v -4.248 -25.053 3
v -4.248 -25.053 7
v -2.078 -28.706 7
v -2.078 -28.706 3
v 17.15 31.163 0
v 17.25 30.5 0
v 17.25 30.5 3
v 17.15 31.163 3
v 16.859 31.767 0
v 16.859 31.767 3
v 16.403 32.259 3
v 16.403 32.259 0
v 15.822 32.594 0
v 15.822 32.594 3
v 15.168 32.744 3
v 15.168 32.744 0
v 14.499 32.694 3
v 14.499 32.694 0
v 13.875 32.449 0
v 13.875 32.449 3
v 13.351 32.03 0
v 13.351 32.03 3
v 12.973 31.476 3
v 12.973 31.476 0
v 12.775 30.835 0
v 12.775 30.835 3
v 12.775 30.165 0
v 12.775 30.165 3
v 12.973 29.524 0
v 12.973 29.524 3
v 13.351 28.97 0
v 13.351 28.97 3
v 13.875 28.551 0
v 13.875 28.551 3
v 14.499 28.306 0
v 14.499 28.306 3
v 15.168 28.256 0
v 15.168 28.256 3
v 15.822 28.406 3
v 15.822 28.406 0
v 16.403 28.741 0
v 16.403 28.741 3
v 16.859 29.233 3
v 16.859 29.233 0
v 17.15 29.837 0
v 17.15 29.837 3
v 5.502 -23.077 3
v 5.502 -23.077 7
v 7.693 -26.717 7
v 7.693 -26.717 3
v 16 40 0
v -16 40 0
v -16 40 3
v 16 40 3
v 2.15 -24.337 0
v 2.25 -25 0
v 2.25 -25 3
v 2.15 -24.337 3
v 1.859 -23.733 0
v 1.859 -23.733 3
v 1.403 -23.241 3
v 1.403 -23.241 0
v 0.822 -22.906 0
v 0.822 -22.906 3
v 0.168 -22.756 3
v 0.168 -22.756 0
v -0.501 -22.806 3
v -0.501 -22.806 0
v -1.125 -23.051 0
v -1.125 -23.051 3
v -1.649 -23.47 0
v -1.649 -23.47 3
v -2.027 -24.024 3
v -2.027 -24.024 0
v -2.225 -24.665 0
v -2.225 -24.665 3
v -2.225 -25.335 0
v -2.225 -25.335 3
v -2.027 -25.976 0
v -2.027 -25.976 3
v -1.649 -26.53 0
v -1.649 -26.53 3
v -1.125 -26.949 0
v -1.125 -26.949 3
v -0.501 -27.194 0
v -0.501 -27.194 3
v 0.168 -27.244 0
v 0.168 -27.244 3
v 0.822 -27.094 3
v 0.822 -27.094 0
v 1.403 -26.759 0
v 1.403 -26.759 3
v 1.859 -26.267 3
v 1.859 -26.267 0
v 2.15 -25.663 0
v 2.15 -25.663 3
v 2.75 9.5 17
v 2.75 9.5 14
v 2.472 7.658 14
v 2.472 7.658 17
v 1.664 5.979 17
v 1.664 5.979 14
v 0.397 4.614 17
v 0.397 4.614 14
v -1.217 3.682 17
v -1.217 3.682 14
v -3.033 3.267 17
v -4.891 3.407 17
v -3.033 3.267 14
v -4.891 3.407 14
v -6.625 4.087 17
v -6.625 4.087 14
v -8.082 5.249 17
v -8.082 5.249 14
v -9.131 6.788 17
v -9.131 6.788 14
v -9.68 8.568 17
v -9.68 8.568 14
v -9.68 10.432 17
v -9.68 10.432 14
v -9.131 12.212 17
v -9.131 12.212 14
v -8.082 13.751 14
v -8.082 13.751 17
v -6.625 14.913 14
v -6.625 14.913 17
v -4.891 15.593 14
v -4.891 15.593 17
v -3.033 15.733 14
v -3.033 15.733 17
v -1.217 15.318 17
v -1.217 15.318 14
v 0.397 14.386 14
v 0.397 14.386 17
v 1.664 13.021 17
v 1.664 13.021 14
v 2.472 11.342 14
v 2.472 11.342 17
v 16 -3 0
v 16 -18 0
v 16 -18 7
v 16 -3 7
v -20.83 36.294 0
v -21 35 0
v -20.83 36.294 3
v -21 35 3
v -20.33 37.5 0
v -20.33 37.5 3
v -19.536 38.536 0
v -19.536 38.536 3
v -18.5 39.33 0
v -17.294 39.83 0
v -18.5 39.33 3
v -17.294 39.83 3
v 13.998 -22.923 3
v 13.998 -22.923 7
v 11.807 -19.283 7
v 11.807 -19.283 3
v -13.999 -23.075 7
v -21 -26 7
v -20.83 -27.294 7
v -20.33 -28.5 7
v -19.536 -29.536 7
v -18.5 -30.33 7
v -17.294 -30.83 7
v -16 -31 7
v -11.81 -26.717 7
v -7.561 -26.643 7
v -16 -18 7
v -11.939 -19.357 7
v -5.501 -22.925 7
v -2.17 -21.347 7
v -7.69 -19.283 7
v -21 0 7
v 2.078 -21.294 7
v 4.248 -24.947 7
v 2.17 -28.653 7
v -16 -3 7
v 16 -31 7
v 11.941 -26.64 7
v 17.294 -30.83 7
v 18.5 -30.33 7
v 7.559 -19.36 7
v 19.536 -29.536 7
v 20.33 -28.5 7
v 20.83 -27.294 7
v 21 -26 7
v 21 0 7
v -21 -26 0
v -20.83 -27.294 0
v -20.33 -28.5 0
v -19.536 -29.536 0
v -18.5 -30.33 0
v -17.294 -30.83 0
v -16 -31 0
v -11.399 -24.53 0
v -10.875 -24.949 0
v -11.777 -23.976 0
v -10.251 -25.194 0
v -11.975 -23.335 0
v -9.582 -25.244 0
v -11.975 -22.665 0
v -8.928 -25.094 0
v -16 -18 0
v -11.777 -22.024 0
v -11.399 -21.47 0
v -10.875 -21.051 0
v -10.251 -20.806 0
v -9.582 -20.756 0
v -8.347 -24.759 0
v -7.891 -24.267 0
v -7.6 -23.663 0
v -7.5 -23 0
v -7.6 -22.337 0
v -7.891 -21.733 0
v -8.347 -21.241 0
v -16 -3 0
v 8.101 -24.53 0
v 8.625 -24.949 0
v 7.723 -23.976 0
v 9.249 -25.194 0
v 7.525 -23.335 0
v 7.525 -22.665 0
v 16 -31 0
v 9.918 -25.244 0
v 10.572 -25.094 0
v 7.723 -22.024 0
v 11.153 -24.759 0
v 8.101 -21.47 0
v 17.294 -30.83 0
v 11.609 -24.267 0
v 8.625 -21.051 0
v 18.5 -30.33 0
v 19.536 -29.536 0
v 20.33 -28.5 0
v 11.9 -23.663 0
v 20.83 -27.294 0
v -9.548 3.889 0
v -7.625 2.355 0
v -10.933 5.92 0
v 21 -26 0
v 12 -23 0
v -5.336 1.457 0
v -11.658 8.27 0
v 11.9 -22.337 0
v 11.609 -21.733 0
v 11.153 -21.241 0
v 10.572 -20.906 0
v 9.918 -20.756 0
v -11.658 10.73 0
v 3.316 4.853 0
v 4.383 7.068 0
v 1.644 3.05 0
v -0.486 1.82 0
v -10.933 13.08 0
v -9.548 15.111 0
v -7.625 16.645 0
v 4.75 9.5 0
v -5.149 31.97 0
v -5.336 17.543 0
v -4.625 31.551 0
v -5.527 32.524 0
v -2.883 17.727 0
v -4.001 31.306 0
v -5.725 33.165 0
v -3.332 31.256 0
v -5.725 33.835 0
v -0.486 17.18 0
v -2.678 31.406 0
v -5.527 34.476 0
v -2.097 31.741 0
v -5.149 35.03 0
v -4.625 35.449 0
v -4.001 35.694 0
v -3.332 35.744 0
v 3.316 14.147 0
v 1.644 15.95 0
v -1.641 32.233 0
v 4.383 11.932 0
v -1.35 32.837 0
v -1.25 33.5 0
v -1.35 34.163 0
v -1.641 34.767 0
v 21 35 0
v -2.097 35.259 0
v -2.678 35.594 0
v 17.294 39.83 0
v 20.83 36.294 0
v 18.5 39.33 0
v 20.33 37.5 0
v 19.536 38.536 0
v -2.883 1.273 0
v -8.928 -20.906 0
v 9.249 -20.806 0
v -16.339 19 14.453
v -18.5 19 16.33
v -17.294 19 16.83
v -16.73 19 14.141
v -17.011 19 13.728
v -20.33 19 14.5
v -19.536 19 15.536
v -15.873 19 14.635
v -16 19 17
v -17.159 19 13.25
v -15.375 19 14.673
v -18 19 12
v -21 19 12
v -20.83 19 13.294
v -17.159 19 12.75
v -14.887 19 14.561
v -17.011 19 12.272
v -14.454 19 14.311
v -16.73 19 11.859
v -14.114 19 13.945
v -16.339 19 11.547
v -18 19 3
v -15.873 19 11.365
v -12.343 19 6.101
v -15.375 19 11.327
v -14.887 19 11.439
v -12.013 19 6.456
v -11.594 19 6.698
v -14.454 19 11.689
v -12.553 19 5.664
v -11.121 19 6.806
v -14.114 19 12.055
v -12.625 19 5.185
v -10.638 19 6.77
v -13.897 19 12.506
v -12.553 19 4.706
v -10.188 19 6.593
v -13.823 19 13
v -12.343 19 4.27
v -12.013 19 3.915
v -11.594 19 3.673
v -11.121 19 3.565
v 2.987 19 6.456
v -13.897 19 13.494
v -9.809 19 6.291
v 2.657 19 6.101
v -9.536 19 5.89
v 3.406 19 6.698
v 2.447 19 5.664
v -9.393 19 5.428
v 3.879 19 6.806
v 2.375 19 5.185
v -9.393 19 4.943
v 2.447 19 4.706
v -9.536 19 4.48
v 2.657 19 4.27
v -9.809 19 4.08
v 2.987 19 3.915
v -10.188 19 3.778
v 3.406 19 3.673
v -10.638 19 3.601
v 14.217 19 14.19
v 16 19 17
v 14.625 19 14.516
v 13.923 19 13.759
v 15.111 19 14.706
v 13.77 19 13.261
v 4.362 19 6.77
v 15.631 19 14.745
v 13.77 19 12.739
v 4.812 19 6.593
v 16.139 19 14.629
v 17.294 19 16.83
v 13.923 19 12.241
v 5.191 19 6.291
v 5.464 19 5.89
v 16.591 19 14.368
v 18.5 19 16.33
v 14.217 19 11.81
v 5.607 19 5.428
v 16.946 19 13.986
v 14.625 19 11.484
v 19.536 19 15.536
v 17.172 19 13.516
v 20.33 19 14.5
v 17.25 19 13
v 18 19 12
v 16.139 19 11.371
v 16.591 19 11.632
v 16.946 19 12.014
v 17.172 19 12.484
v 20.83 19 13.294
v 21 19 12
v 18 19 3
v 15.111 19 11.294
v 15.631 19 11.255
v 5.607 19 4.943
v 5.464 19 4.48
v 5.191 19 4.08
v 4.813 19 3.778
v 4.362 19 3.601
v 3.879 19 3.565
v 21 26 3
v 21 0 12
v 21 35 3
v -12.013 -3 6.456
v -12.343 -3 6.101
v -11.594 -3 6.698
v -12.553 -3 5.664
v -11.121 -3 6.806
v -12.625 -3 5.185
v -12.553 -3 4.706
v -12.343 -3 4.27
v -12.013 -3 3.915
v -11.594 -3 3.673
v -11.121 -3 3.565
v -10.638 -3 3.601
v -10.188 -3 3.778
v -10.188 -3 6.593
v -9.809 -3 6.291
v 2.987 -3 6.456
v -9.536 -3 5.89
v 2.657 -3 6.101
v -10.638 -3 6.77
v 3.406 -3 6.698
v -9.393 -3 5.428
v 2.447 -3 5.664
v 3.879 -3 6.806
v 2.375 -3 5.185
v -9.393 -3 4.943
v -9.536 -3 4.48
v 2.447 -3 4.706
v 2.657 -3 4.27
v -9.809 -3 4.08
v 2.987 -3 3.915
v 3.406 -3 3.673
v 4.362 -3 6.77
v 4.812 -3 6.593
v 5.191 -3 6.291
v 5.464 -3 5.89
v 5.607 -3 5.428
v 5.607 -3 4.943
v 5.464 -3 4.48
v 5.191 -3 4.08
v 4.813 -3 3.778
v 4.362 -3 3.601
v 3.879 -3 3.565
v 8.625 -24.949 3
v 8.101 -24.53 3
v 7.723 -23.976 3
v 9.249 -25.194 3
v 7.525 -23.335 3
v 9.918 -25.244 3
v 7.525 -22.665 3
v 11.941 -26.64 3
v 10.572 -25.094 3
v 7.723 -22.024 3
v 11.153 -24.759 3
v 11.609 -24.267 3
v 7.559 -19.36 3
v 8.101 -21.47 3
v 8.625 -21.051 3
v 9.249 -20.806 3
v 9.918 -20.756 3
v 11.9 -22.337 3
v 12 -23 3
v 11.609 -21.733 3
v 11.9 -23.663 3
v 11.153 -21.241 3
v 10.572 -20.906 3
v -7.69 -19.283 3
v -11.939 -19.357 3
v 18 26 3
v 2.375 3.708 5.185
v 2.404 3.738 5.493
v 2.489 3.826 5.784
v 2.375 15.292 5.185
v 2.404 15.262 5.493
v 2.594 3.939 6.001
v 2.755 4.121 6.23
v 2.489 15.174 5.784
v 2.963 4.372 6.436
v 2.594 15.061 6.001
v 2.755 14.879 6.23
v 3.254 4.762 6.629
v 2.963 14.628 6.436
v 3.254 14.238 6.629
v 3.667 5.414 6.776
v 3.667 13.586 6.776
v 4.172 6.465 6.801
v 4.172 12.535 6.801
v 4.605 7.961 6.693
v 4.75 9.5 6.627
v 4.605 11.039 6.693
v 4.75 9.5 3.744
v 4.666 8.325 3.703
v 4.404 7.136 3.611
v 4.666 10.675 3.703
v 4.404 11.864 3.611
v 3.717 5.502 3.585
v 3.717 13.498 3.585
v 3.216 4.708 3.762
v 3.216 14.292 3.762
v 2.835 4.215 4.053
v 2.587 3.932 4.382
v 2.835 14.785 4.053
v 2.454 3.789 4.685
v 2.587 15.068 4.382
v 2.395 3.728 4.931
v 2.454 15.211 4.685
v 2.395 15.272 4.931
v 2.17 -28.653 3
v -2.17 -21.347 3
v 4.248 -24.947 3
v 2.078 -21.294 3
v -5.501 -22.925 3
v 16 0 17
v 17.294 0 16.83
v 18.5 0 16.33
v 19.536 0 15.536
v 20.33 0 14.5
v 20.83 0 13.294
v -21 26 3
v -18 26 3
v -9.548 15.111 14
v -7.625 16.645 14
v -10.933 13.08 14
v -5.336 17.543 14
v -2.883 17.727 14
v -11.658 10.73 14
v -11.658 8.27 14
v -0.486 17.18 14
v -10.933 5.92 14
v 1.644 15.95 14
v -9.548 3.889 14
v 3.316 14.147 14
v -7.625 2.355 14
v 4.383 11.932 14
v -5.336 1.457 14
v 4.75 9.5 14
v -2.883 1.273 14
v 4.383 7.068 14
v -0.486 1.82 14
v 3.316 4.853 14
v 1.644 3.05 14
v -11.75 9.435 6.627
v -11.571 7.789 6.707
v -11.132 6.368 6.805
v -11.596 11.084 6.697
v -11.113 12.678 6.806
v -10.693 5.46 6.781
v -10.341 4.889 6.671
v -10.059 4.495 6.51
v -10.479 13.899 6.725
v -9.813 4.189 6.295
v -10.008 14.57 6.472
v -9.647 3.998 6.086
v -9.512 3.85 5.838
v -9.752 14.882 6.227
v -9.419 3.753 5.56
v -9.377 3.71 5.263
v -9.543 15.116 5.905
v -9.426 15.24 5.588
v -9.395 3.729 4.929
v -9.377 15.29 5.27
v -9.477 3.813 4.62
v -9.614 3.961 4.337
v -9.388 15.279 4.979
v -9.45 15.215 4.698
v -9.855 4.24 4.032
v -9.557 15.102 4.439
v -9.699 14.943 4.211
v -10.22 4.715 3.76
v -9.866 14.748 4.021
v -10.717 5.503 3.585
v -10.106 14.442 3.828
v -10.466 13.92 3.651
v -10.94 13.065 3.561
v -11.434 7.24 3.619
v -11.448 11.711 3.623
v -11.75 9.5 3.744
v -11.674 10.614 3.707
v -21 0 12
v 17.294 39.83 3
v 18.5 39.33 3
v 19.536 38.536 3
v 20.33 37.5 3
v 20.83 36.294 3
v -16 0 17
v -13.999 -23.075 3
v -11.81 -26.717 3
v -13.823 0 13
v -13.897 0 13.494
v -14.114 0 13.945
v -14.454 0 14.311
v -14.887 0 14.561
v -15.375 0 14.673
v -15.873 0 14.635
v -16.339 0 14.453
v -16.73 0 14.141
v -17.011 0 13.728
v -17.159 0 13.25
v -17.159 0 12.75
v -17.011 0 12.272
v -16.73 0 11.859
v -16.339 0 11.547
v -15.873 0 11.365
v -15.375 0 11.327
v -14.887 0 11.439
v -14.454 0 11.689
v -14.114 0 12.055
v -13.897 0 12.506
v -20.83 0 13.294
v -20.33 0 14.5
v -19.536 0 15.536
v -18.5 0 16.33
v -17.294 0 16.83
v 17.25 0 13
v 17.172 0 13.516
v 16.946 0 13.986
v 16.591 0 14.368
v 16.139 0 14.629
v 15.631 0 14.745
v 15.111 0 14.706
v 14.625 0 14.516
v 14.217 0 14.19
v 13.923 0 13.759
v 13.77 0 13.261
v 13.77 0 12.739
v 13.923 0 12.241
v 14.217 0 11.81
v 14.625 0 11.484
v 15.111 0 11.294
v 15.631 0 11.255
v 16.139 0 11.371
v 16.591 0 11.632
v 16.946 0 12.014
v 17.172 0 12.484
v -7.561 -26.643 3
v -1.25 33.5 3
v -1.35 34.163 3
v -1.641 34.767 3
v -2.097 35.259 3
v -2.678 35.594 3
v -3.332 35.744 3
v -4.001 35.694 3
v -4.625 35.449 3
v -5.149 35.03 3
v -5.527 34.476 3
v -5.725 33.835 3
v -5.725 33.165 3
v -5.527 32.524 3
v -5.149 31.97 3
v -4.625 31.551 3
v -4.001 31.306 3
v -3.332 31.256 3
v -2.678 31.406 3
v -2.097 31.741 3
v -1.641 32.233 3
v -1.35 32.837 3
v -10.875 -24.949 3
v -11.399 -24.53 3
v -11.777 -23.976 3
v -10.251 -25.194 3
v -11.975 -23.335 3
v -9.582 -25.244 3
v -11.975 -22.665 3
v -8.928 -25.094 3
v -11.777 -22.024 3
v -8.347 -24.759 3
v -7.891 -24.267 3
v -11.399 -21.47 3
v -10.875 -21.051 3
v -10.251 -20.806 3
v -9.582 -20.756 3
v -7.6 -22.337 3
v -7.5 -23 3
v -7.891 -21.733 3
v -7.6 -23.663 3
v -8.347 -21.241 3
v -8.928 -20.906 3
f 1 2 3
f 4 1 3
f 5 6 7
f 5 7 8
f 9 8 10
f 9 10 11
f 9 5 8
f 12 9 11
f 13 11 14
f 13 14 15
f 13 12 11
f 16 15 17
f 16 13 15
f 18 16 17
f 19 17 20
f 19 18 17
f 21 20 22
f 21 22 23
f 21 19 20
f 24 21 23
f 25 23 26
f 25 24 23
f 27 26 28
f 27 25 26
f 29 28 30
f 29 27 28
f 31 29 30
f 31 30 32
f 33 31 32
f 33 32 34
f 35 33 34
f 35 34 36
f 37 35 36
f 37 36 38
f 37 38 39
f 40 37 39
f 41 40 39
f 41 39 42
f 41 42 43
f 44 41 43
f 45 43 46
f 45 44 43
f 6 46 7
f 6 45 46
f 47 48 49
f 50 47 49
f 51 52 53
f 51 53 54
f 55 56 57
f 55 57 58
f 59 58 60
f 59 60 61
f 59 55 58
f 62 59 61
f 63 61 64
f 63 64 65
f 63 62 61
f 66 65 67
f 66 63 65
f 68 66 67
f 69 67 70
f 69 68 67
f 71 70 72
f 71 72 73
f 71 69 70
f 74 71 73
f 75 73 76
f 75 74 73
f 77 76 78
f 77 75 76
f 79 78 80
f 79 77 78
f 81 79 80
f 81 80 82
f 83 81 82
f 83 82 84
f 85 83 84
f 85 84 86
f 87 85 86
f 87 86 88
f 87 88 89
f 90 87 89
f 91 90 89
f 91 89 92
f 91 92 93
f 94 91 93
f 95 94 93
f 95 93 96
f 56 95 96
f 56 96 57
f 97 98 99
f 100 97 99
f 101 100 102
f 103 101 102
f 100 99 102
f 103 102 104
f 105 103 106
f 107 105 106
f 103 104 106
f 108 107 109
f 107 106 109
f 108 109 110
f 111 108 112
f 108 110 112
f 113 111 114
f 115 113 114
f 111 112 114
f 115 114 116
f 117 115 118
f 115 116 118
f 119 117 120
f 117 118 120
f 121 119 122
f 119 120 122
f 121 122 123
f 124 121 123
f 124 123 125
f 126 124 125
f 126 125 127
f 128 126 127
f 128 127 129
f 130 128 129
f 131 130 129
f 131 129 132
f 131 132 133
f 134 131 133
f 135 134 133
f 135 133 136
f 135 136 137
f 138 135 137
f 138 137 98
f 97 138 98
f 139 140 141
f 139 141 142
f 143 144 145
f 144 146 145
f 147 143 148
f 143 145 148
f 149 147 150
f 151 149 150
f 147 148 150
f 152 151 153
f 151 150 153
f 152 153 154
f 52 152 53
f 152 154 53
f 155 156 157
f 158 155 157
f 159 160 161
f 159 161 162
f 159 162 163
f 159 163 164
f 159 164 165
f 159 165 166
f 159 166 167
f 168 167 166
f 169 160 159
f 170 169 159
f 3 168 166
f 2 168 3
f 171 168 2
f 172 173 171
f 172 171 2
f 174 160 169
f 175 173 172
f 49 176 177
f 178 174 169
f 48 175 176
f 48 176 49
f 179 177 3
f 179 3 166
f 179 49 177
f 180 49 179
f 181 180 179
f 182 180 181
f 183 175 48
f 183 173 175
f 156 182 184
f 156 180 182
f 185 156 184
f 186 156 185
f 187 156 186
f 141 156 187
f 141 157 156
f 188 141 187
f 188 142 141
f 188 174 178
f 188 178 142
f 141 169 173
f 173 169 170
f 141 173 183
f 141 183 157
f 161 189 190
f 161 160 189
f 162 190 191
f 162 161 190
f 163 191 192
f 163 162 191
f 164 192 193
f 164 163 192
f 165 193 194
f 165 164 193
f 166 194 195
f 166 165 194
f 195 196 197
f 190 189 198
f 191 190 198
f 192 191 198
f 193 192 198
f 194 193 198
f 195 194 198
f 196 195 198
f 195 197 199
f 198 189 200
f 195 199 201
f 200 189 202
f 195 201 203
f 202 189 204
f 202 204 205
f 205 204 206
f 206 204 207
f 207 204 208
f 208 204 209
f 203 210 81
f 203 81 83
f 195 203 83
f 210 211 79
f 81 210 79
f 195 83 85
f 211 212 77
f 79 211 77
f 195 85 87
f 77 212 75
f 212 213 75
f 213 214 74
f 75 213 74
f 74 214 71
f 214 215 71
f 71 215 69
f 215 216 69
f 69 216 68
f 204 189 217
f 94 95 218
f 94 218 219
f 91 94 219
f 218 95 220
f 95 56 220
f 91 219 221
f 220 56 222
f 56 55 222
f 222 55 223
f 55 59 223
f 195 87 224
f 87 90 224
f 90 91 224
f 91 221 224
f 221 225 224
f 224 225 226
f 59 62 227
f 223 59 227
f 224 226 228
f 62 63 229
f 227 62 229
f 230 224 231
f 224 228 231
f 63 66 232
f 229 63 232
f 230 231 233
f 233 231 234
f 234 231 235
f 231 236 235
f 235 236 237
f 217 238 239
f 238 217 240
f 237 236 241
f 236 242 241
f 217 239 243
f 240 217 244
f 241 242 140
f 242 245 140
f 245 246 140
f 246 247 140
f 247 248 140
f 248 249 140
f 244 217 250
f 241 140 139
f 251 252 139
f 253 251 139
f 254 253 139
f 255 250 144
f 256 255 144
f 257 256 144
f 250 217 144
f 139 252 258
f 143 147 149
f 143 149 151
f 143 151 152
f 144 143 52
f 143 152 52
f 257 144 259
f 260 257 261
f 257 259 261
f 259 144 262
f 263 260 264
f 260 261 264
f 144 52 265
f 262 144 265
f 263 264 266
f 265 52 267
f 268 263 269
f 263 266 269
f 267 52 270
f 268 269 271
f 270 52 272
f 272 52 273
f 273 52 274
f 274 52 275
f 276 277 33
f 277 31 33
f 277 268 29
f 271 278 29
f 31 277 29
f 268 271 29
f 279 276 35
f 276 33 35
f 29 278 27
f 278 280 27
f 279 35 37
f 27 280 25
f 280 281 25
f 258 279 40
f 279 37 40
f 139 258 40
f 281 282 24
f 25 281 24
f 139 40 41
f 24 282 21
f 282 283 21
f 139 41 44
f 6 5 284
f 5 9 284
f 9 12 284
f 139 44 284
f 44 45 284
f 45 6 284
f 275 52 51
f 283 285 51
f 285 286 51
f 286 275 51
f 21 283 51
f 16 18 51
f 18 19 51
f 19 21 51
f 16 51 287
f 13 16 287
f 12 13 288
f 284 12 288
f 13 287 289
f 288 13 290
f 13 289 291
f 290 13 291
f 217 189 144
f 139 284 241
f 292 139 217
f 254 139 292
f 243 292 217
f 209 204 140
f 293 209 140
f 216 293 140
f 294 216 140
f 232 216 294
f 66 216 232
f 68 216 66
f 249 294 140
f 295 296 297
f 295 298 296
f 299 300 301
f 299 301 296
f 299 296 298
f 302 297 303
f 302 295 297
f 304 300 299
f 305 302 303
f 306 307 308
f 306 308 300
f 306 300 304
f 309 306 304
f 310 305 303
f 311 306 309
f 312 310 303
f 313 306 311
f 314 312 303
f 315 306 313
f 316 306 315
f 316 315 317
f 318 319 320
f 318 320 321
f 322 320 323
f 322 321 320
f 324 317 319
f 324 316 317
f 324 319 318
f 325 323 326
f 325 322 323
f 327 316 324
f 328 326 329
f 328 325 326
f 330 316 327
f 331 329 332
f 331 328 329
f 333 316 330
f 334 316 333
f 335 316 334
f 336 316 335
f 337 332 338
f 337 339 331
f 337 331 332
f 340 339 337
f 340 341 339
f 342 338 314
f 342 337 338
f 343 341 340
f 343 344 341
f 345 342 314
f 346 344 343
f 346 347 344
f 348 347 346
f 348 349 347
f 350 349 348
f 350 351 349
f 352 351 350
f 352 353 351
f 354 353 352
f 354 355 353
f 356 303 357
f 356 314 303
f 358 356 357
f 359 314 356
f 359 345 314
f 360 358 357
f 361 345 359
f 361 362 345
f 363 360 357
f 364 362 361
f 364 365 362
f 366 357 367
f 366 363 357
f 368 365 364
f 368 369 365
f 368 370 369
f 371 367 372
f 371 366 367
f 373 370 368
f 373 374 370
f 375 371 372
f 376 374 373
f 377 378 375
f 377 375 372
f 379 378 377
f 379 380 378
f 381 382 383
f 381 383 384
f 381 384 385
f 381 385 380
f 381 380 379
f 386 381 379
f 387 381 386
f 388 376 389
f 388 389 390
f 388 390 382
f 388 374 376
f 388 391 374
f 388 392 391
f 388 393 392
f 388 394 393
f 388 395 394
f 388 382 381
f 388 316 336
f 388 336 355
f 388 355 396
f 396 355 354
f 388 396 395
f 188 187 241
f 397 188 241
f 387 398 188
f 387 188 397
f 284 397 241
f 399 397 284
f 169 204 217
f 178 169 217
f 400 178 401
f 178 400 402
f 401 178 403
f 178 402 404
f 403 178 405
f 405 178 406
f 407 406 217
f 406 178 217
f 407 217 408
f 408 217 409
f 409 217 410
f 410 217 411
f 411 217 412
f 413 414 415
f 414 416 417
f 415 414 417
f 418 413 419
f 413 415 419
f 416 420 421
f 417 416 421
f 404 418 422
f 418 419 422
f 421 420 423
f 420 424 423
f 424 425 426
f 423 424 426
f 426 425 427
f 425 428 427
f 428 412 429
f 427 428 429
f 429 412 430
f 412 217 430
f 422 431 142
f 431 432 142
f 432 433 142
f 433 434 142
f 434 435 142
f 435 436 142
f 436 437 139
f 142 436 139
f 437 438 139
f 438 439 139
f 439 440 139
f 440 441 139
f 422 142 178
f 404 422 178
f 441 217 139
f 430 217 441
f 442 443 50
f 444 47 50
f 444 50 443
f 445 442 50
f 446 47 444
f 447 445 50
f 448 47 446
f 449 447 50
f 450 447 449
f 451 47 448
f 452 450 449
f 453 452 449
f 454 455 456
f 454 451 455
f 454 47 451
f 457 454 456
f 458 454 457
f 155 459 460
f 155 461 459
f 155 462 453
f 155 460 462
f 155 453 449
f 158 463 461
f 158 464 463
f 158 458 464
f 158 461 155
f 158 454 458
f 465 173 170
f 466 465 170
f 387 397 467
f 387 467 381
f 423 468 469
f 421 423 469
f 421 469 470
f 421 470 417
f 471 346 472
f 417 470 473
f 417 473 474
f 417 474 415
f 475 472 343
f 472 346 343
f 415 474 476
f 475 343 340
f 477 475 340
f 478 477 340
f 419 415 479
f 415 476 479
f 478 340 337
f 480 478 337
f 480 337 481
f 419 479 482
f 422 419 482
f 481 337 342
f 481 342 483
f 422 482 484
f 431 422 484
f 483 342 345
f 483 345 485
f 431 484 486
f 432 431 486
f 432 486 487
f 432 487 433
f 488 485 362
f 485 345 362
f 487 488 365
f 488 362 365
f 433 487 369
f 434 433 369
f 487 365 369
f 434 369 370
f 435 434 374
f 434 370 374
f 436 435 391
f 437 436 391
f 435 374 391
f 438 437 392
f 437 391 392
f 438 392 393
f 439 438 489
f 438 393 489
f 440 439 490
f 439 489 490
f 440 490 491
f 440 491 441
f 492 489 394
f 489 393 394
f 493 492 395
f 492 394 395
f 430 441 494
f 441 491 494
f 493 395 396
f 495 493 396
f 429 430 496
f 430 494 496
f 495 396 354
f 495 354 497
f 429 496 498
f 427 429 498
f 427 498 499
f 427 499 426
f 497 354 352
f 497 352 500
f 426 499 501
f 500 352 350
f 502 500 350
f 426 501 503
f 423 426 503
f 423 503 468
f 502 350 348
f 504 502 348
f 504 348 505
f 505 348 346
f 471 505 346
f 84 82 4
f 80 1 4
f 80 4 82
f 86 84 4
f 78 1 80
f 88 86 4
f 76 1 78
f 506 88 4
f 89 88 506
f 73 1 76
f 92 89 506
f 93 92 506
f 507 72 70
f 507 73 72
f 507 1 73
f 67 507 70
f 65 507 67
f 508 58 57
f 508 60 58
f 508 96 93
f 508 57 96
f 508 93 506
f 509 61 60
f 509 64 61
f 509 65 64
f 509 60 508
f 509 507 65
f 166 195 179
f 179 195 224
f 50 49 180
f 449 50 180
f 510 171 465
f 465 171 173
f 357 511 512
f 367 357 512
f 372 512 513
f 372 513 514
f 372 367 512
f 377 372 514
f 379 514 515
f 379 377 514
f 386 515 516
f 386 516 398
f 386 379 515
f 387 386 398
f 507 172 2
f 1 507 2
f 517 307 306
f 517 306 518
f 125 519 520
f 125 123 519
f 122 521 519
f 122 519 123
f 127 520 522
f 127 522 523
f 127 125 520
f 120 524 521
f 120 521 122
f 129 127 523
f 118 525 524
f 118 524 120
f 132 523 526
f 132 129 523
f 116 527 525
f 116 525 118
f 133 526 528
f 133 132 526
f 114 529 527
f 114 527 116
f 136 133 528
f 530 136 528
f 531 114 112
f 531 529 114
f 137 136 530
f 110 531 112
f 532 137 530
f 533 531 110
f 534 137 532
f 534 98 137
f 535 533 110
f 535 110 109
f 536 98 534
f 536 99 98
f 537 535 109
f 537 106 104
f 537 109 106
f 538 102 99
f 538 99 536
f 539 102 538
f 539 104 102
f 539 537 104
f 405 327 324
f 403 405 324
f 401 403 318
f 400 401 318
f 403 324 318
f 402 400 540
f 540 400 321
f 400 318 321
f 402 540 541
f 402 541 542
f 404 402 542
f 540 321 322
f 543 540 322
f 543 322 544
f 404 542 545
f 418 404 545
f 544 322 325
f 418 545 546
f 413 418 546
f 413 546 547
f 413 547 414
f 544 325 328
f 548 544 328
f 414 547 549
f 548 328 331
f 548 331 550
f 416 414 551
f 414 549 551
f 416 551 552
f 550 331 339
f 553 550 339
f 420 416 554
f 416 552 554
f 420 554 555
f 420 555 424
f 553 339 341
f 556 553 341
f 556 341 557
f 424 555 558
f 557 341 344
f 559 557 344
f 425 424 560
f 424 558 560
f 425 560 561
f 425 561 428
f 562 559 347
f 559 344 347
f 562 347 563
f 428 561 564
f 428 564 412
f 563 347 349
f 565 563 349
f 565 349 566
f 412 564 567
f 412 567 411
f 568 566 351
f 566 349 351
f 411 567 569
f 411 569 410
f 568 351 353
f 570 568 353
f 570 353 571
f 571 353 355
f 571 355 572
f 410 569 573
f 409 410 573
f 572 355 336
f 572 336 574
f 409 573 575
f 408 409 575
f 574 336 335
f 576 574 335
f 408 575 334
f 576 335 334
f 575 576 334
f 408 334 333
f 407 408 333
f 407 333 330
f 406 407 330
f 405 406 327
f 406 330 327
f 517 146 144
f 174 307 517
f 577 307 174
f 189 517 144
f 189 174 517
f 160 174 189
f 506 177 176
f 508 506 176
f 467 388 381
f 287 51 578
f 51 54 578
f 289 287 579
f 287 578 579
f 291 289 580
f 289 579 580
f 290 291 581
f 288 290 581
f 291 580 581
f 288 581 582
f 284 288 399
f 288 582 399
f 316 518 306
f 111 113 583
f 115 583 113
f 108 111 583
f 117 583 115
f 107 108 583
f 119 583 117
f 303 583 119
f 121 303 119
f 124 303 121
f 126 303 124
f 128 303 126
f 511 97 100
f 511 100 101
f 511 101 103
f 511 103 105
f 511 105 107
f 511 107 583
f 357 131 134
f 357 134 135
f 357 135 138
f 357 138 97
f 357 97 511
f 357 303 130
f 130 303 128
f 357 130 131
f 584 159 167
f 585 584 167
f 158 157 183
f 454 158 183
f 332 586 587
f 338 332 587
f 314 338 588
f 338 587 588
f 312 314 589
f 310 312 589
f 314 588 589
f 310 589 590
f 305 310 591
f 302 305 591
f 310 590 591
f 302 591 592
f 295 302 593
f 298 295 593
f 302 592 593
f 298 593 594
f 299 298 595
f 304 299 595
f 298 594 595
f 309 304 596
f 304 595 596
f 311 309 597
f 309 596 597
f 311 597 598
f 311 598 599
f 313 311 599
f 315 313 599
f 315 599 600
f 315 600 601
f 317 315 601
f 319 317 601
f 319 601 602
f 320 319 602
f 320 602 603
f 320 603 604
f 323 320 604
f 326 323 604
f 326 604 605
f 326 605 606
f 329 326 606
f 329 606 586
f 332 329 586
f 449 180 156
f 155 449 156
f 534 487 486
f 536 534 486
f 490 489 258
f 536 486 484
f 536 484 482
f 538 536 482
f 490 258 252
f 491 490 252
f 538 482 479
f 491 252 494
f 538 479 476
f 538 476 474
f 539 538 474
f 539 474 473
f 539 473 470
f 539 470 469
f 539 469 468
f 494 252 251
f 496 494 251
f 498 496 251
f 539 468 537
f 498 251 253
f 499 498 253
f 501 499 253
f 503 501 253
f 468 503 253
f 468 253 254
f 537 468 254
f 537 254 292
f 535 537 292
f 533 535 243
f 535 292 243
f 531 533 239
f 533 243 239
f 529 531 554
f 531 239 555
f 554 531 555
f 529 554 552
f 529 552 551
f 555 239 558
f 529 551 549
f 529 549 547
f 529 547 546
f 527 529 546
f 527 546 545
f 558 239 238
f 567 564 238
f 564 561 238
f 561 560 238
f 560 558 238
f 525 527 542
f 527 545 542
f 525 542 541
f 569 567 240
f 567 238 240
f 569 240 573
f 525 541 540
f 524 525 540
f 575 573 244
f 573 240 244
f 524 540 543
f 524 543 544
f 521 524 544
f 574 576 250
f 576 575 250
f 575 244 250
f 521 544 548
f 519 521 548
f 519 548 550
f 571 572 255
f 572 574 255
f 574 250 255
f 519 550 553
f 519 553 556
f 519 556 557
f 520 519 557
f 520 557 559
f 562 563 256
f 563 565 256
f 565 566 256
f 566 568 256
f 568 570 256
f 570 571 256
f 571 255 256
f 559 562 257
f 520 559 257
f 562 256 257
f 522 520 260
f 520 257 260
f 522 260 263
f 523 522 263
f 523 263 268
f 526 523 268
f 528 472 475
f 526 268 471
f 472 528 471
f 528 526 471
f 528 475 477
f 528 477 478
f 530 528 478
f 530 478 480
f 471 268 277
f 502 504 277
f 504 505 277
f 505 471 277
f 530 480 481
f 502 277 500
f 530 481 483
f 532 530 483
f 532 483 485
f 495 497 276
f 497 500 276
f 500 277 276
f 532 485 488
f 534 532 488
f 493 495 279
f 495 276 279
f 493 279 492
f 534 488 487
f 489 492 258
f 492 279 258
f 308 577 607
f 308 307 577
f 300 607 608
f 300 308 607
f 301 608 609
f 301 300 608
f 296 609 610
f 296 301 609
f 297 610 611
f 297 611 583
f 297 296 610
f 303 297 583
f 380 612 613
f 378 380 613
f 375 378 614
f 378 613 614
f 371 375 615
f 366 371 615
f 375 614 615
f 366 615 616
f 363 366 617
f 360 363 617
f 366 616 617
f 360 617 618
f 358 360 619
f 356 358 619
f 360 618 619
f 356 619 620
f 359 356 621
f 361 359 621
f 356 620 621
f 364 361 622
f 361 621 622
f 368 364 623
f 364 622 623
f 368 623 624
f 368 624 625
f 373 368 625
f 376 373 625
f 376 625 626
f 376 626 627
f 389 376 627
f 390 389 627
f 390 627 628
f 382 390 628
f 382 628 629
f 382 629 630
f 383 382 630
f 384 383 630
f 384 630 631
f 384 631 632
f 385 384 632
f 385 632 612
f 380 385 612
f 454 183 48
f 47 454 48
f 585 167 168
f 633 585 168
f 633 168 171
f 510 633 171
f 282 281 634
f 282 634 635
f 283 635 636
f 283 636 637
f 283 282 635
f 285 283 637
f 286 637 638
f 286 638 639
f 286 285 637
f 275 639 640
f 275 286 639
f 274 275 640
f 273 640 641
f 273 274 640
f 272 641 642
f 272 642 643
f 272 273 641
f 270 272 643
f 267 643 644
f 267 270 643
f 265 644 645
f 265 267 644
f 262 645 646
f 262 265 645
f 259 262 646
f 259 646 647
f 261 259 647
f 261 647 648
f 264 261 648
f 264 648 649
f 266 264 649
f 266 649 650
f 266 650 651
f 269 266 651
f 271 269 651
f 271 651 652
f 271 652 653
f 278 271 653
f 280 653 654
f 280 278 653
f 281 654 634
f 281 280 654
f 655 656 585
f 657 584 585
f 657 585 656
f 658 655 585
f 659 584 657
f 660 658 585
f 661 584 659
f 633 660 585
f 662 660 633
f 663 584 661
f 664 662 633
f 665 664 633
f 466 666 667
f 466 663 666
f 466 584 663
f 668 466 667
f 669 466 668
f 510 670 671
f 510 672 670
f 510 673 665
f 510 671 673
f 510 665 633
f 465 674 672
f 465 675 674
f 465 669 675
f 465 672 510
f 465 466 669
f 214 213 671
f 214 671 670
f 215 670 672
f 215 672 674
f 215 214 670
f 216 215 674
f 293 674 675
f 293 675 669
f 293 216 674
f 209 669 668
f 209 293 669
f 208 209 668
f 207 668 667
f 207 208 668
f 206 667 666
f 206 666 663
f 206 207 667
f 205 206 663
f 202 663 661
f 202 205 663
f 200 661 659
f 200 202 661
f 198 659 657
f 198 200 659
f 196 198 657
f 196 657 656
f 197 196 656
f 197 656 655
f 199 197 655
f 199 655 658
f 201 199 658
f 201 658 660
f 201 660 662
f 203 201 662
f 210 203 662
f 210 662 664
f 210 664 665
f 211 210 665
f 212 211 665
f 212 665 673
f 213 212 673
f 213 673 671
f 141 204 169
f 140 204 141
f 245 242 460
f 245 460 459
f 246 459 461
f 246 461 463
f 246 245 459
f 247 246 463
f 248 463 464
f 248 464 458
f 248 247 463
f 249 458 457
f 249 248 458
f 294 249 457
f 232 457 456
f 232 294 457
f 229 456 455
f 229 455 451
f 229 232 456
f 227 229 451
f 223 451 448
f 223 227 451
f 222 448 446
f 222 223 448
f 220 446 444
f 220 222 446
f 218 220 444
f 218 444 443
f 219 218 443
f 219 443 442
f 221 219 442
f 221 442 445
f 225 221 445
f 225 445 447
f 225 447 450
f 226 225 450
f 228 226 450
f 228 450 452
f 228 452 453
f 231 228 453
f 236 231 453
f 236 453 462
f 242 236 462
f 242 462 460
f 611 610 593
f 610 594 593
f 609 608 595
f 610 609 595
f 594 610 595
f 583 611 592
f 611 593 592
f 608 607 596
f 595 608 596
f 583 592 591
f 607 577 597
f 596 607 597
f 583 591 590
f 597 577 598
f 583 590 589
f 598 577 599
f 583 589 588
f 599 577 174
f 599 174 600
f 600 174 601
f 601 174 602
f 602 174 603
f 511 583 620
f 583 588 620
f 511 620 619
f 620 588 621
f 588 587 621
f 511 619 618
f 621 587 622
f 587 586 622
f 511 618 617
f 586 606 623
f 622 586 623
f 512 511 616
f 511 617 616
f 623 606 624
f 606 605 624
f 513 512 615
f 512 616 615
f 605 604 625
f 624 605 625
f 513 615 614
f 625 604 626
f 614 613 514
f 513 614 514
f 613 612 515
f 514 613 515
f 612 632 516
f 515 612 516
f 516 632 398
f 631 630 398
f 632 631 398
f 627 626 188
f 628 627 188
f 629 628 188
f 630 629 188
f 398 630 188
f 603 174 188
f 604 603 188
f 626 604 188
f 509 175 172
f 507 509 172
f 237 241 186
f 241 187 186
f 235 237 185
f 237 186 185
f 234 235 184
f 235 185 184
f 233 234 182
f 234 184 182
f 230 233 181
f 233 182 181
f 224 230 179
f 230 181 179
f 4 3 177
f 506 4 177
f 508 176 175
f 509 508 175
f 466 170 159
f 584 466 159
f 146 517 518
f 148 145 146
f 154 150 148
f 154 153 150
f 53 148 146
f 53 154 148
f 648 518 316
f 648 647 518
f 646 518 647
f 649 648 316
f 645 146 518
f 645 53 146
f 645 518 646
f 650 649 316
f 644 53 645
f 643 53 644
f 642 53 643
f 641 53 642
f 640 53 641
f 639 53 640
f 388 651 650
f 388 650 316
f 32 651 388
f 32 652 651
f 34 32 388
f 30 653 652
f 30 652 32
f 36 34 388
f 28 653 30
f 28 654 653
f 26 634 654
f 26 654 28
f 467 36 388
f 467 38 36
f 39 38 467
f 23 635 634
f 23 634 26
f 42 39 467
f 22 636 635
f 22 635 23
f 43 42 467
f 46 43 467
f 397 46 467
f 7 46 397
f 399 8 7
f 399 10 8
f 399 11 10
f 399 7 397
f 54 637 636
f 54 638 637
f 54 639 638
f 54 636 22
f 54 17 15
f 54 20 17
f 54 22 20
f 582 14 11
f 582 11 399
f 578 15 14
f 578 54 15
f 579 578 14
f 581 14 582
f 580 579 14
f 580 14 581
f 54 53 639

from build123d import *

# Parameters (mm, degrees)
F0_W      = 42
F0_H      = 31
F0_R      = 2.25
F0_W_2    = 32
F0_H_2    = 15
F1_DEPTH  = 7
F0_H_3    = 21
F2_DEPTH  = 3
F0_H_4    = 19
F3_DEPTH  = 17
F4_R      = 5
F5_R      = 5
F6_R      = 6.25
F7_DEPTH  = 25
F9_DEPTH  = 3
F11_DEPTH = 3
F12_R     = 1.6772479293
F12_R_2   = 1.75
F13_DEPTH = 25
F6_R_2    = 8.25
F14_DEPTH = 14
F15_R     = 1.625
F16_DEPTH = 30
F17_R     = 2.25
F18_DEPTH = 4


with BuildPart() as f1:
    # F0 (on Top) → F1 (new body)
    with BuildSketch(Plane.XY):
        with Locations((0, -15.5)):
            Rectangle(F0_W, F0_H)
        with Locations((-9.75, -23)):
            Circle(F0_R, mode=Mode.SUBTRACT)
        with Locations((0, -25)):
            Circle(F0_R, mode=Mode.SUBTRACT)
        with Locations((9.75, -23)):
            Circle(F0_R, mode=Mode.SUBTRACT)
        with Locations((0, -10.5)):
            Rectangle(F0_W_2, F0_H_2, mode=Mode.SUBTRACT)
    extrude(amount=F1_DEPTH)



with BuildPart() as f2:
    # F0 (on Top) → F2 (new body)
    with BuildSketch(Plane.XY):
        with Locations((0, 29.5)):
            Rectangle(F0_W, F0_H_3)
        with Locations((-3.5, 33.5)):
            Circle(F0_R, mode=Mode.SUBTRACT)
        with Locations((15, 30.5)):
            Circle(F0_R, mode=Mode.SUBTRACT)
    extrude(amount=F2_DEPTH)


with BuildPart() as f1_1:
    add(f1.part)

    add(f2.part)  # F3 merges F2
    # F0 (on Top) → F3 (join)
    with BuildSketch(Plane.XY):
        with Locations((0, 9.5)):
            Rectangle(F0_W, F0_H_4)
    extrude(amount=F3_DEPTH)

    # F4
    f4_edges = [f1_1.edges().sort_by_distance(p)[0] for p in [
        (-21, -31, 3.5),
        (21, -31, 3.5),
    ]]
    fillet(f4_edges, radius=F4_R)

    # F5
    f5_edges = [f1_1.edges().sort_by_distance(p)[0] for p in [
        (-21, 40, 1.5),
        (21, 40, 1.5),
        (21, 9.5, 17),
        (-21, 9.5, 17),
    ]]
    fillet(f5_edges, radius=F5_R)

    # F6 (on face) → F7 (cut)
    with BuildSketch(Plane(origin=(0, 0, 0), x_dir=(1, 0, 0), z_dir=(0, 0, -1))):
        with Locations((-3.5, -9.5)):
            Circle(F6_R)
    extrude(amount=-F7_DEPTH, mode=Mode.SUBTRACT)

    # F8 (on face) → F9 (join)
    with BuildSketch(Plane(origin=(-21, 0, 0), x_dir=(0, -1, 0), z_dir=(-1, 0, 0))):
        Polygon((-19, 3), (-19, 12), (-26, 3), align=None)
    extrude(amount=-F9_DEPTH)

    # F10 (on face) → F11 (join)
    with BuildSketch(Plane.YZ.offset(21)):
        Polygon((26, 3), (19, 12), (19, 3), align=None)
    extrude(amount=-F11_DEPTH)

    # F12 (on face) → F13 (cut)
    with BuildSketch(Plane.XZ):
        with Locations((-15.5, 13)):
            Circle(F12_R)
        with Locations((15.5, 13)):
            Circle(F12_R_2)
    extrude(amount=-F13_DEPTH, mode=Mode.SUBTRACT)

    # F6 (on face) → F14 (cut)
    with BuildSketch(Plane(origin=(0, 0, 0), x_dir=(1, 0, 0), z_dir=(0, 0, -1))):
        with Locations((-3.5, -9.5)):
            Circle(F6_R_2)
        with Locations((-3.5, -9.5)):
            Circle(F6_R, mode=Mode.SUBTRACT)
    extrude(amount=-F14_DEPTH, mode=Mode.SUBTRACT)

    # F15 (on face) → F16 (cut)
    with BuildSketch(Plane(origin=(0, 19, 0), x_dir=(-1, 0, 0), z_dir=(0, 1, 0))):
        with Locations((-4, 5.1853246987)):
            Circle(F15_R)
        with Locations((11, 5.1853246987)):
            Circle(F15_R)
    extrude(amount=-F16_DEPTH, mode=Mode.SUBTRACT)

    # F17 (on face) → F18 (cut)
    with BuildSketch(Plane.XY.offset(7)):
        Polygon((-5.5006545536, -22.9254126202), (-7.6899218425, -19.2826652041), (-11.9392672889, -19.3572525839), (-13.9993454464, -23.0745873798), (-11.8100781575, -26.7173347959), (-7.5607327111, -26.6427474161), align=None)
        with Locations((-9.75, -23)):
            Circle(F17_R, mode=Mode.SUBTRACT)
        Polygon((4.2483044025, -24.9471547253), (2.0783868508, -21.2944378271), (-2.1699175516, -21.3472831018), (-4.2483044025, -25.0528452747), (-2.0783868508, -28.7055621729), (2.1699175516, -28.6527168982), align=None)
        with Locations((0, -25)):
            Circle(F17_R, mode=Mode.SUBTRACT)
        Polygon((13.9979346939, -22.9229691252), (11.8072566524, -19.2826652041), (7.5593219586, -19.3596960789), (5.5020653061, -23.0770308748), (7.6927433476, -26.7173347959), (11.9406780414, -26.6403039211), align=None)
        with Locations((9.75, -23)):
            Circle(F17_R, mode=Mode.SUBTRACT)
    extrude(amount=-F18_DEPTH, mode=Mode.SUBTRACT)


solid = f1_1.part
